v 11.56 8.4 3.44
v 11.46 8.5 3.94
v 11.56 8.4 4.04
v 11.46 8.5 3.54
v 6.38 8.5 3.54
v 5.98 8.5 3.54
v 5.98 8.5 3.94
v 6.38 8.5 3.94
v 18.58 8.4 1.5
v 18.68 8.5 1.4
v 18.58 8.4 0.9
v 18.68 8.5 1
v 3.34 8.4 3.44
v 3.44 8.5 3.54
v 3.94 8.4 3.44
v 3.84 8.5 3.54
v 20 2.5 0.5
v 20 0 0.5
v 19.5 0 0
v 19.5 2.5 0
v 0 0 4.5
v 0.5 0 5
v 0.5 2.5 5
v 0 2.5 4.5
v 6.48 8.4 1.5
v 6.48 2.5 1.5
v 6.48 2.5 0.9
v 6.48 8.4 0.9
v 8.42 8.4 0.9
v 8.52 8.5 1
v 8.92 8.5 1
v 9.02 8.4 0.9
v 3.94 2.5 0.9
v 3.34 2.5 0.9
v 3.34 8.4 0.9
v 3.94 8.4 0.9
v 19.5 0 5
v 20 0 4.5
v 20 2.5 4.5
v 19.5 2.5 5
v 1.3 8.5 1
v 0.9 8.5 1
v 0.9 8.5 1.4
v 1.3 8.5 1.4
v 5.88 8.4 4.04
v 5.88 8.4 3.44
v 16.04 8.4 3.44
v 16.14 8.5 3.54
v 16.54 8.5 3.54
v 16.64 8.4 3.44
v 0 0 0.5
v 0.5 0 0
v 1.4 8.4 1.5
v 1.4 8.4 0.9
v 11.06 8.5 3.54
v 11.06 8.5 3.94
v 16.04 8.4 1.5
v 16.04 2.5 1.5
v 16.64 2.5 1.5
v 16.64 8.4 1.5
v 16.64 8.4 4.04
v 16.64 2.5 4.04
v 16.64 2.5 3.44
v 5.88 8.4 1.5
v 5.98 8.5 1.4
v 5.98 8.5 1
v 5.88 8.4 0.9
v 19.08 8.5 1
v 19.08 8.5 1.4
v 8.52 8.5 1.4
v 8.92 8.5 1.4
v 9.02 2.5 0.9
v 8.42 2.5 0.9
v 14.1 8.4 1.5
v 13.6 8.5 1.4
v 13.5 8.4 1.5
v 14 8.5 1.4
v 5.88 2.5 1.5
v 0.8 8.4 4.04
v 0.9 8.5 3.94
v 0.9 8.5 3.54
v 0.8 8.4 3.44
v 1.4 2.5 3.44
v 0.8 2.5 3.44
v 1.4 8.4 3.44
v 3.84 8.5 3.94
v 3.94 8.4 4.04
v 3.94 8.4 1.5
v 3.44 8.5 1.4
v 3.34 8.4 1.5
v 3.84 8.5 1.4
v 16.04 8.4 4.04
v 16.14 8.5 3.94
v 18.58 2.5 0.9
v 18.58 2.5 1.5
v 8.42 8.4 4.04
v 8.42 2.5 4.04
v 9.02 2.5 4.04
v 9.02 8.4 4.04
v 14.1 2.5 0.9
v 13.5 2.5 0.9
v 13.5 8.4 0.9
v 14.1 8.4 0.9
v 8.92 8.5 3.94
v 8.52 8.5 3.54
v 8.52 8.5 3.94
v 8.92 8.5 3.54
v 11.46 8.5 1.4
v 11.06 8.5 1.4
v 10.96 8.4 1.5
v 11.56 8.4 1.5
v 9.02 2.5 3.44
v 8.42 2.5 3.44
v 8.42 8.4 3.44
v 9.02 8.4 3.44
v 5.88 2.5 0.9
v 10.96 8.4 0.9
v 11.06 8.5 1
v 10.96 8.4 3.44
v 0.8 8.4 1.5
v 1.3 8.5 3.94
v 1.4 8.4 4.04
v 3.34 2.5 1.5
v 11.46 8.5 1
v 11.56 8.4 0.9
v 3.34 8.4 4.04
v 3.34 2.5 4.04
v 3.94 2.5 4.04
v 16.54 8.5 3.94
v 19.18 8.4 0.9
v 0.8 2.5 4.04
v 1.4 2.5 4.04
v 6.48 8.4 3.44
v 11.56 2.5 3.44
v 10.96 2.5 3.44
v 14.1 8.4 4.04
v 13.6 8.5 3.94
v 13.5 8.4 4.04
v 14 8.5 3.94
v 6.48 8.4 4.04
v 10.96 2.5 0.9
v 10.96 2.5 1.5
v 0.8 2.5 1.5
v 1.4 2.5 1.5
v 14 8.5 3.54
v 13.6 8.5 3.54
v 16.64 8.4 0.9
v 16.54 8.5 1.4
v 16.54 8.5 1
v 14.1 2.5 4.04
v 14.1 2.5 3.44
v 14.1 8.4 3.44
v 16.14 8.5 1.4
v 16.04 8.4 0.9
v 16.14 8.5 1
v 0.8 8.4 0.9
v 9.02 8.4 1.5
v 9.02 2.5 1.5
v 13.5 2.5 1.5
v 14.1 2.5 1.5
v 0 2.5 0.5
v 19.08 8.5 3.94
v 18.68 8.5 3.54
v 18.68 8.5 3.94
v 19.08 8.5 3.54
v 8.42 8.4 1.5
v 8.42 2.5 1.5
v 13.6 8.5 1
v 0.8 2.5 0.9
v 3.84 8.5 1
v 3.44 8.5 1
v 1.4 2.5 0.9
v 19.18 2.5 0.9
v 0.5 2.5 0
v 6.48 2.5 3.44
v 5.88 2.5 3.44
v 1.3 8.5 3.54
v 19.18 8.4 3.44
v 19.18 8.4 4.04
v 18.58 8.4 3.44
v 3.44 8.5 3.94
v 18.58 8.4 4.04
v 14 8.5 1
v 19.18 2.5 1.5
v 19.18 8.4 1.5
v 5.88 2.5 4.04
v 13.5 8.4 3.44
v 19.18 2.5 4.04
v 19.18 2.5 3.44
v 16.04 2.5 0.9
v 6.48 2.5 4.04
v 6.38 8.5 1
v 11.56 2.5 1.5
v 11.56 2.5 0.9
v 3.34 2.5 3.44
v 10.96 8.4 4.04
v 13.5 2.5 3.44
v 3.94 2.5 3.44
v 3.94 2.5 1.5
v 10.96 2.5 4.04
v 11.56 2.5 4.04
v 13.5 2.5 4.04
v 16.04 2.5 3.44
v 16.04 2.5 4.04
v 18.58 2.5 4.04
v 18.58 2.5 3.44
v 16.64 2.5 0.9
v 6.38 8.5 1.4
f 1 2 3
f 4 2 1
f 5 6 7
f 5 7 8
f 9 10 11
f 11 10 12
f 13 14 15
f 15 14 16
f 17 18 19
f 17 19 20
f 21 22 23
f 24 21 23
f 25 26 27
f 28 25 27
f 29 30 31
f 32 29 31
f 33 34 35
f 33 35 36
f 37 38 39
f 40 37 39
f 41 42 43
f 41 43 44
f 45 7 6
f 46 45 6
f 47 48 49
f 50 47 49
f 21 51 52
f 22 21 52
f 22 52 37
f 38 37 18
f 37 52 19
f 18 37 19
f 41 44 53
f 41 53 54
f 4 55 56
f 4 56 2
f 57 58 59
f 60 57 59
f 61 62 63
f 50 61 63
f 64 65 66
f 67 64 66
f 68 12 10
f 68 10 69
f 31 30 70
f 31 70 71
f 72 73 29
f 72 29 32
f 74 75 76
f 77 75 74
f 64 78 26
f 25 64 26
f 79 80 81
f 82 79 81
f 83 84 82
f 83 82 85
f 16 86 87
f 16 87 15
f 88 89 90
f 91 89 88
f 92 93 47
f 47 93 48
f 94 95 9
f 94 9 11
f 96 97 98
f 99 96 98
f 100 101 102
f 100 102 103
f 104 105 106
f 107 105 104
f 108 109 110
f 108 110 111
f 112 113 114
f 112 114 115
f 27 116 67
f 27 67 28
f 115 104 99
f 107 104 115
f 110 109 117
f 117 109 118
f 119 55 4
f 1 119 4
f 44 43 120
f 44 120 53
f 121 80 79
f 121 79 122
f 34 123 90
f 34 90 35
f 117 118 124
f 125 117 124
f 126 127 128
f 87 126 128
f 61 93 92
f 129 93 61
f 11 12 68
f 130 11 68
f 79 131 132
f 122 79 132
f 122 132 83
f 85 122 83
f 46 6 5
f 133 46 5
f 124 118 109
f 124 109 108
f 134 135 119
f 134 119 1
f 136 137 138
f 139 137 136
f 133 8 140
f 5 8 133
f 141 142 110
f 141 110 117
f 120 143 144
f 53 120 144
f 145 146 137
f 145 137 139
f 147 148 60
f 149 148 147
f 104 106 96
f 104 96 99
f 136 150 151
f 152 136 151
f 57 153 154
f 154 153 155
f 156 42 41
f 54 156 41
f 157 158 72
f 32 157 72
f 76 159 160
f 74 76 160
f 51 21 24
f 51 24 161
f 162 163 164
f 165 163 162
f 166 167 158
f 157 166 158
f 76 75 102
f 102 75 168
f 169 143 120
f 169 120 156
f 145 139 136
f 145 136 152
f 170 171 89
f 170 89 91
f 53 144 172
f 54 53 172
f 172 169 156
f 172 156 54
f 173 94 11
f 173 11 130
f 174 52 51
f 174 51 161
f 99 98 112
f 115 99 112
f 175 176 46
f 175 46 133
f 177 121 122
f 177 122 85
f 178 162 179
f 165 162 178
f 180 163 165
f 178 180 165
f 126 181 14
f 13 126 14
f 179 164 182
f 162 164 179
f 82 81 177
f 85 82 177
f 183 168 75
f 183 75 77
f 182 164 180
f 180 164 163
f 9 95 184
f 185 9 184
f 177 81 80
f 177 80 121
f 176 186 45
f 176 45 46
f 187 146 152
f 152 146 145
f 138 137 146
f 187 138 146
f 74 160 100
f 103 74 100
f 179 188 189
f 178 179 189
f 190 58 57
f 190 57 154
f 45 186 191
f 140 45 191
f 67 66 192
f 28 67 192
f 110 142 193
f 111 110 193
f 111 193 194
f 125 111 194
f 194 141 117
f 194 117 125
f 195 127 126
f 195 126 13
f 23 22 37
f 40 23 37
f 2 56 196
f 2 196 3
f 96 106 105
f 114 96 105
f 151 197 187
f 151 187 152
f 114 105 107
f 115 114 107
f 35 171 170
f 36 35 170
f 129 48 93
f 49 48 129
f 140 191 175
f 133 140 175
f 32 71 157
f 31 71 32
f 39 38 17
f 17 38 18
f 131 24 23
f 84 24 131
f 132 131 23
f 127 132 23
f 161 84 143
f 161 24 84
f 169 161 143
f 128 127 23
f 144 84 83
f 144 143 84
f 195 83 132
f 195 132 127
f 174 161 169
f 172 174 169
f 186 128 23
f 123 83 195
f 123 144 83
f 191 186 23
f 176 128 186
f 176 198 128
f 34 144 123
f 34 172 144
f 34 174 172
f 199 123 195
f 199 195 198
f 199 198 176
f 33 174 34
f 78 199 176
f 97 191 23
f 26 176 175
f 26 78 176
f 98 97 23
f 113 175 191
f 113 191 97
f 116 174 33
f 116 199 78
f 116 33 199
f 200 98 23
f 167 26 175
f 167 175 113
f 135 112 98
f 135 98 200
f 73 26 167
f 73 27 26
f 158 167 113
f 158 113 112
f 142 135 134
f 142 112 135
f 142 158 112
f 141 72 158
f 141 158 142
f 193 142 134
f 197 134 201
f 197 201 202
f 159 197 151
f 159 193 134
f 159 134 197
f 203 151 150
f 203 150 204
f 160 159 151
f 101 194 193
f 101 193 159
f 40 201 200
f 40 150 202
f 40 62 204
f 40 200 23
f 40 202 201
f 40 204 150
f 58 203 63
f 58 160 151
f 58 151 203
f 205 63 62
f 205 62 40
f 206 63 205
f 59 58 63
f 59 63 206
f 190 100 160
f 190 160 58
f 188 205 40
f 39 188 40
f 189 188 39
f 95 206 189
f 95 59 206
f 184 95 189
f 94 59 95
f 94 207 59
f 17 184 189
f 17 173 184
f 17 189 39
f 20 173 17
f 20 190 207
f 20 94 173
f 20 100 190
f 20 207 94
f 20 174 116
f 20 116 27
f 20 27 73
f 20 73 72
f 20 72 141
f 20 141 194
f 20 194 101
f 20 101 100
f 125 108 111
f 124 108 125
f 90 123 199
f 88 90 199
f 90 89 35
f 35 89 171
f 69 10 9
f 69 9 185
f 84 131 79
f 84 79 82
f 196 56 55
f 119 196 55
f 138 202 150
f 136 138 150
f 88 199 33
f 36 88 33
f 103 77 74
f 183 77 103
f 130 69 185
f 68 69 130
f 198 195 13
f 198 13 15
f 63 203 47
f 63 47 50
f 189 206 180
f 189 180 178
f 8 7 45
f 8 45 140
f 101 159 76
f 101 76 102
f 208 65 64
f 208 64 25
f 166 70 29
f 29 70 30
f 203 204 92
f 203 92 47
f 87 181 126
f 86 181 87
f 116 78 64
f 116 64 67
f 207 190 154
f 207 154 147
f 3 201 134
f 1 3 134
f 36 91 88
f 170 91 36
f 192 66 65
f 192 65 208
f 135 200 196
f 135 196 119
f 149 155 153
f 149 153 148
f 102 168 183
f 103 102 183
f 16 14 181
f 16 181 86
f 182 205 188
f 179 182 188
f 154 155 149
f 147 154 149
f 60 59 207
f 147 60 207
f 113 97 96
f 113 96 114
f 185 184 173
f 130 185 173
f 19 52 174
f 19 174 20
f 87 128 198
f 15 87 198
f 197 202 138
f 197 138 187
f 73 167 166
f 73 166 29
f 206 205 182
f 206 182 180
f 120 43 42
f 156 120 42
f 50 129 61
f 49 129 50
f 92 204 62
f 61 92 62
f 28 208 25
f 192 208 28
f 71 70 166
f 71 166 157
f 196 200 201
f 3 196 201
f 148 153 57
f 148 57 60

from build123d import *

# Parameters (mm, degrees)
ESQUISSE1_W        = 20
ESQUISSE1_H        = 5
BOSS_EXTRU_1_DEPTH = 2.5
ESQUISSE2_W        = 0.6
ESQUISSE2_H        = 0.6
BOSS_EXTRU_2_DEPTH = 6
CHANFREIN1_SIZE    = 0.1
CHANFREIN2_SIZE    = 0.5


with BuildPart() as part:
    # Esquisse1 → Boss.-Extru.1 (new body)
    with BuildSketch(Plane(origin=(0, 0, 0), x_dir=(1, 0, 0), z_dir=(0, 1, 0))):
        with Locations((10, -2.5)):
            Rectangle(ESQUISSE1_W, ESQUISSE1_H)
    extrude(amount=BOSS_EXTRU_1_DEPTH)

    # Esquisse2 → Boss.-Extru.2 (add)
    with BuildSketch(Plane(origin=(0, 2.5, 0), x_dir=(1, 0, 0), z_dir=(0, 1, 0))):
        with Locations((1.1, -1.2)):
            Rectangle(ESQUISSE2_W, ESQUISSE2_H)
        with Locations((1.1, -3.74)):
            Rectangle(ESQUISSE2_W, ESQUISSE2_H)
        with Locations((3.64, -1.2)):
            Rectangle(ESQUISSE2_W, ESQUISSE2_H)
        with Locations((3.64, -3.74)):
            Rectangle(ESQUISSE2_W, ESQUISSE2_H)
        with Locations((6.18, -1.2)):
            Rectangle(ESQUISSE2_W, ESQUISSE2_H)
        with Locations((6.18, -3.74)):
            Rectangle(ESQUISSE2_W, ESQUISSE2_H)
        with Locations((8.72, -1.2)):
            Rectangle(ESQUISSE2_W, ESQUISSE2_H)
        with Locations((8.72, -3.74)):
            Rectangle(ESQUISSE2_W, ESQUISSE2_H)
        with Locations((11.26, -1.2)):
            Rectangle(ESQUISSE2_W, ESQUISSE2_H)
        with Locations((11.26, -3.74)):
            Rectangle(ESQUISSE2_W, ESQUISSE2_H)
        with Locations((13.8, -1.2)):
            Rectangle(ESQUISSE2_W, ESQUISSE2_H)
        with Locations((13.8, -3.74)):
            Rectangle(ESQUISSE2_W, ESQUISSE2_H)
        with Locations((16.34, -1.2)):
            Rectangle(ESQUISSE2_W, ESQUISSE2_H)
        with Locations((16.34, -3.74)):
            Rectangle(ESQUISSE2_W, ESQUISSE2_H)
        with Locations((18.88, -1.2)):
            Rectangle(ESQUISSE2_W, ESQUISSE2_H)
        with Locations((18.88, -3.74)):
            Rectangle(ESQUISSE2_W, ESQUISSE2_H)
    extrude(amount=BOSS_EXTRU_2_DEPTH)

    # Chanfrein1
    chanfrein1_edges = [part.edges().sort_by_distance(p)[0] for p in [
        (10.96, 8.5, 1.2),
        (11.26, 8.5, 1.5),
        (11.56, 8.5, 1.2),
        (11.26, 8.5, 0.9),
        (10.96, 8.5, 3.74),
        (11.26, 8.5, 4.04),
        (11.56, 8.5, 3.74),
        (11.26, 8.5, 3.44),
        (13.5, 8.5, 1.2),
        (13.8, 8.5, 1.5),
        (14.1, 8.5, 1.2),
        (13.8, 8.5, 0.9),
        (13.5, 8.5, 3.74),
        (13.8, 8.5, 4.04),
        (14.1, 8.5, 3.74),
        (13.8, 8.5, 3.44),
        (16.04, 8.5, 1.2),
        (16.34, 8.5, 1.5),
        (16.64, 8.5, 1.2),
        (16.34, 8.5, 0.9),
        (16.04, 8.5, 3.74),
        (16.34, 8.5, 4.04),
        (16.64, 8.5, 3.74),
        (16.34, 8.5, 3.44),
        (18.58, 8.5, 1.2),
        (18.88, 8.5, 1.5),
        (19.18, 8.5, 1.2),
        (0.8, 8.5, 1.2),
        (18.88, 8.5, 0.9),
        (1.1, 8.5, 1.5),
        (1.4, 8.5, 1.2),
        (1.1, 8.5, 0.9),
        (18.58, 8.5, 3.74),
        (18.88, 8.5, 4.04),
        (19.18, 8.5, 3.74),
        (18.88, 8.5, 3.44),
        (0.8, 8.5, 3.74),
        (1.1, 8.5, 4.04),
        (1.4, 8.5, 3.74),
        (1.1, 8.5, 3.44),
        (3.34, 8.5, 1.2),
        (3.64, 8.5, 1.5),
        (3.94, 8.5, 1.2),
        (3.64, 8.5, 0.9),
        (3.34, 8.5, 3.74),
        (3.64, 8.5, 4.04),
        (3.94, 8.5, 3.74),
        (3.64, 8.5, 3.44),
        (5.88, 8.5, 1.2),
        (6.18, 8.5, 1.5),
        (6.48, 8.5, 1.2),
        (6.18, 8.5, 0.9),
        (5.88, 8.5, 3.74),
        (6.18, 8.5, 4.04),
        (6.48, 8.5, 3.74),
        (6.18, 8.5, 3.44),
        (8.42, 8.5, 1.2),
        (8.72, 8.5, 1.5),
        (9.02, 8.5, 1.2),
        (8.72, 8.5, 0.9),
        (8.42, 8.5, 3.74),
        (8.72, 8.5, 4.04),
        (9.02, 8.5, 3.74),
        (8.72, 8.5, 3.44),
    ]]
    chamfer(chanfrein1_edges, length=CHANFREIN1_SIZE)

    # Chanfrein2
    chanfrein2_edges = [part.edges().sort_by_distance(p)[0] for p in [
        (0, 1.25, 0),
        (20, 1.25, 0),
        (20, 1.25, 5),
        (0, 1.25, 5),
    ]]
    chamfer(chanfrein2_edges, length=CHANFREIN2_SIZE)


solid = part.part
